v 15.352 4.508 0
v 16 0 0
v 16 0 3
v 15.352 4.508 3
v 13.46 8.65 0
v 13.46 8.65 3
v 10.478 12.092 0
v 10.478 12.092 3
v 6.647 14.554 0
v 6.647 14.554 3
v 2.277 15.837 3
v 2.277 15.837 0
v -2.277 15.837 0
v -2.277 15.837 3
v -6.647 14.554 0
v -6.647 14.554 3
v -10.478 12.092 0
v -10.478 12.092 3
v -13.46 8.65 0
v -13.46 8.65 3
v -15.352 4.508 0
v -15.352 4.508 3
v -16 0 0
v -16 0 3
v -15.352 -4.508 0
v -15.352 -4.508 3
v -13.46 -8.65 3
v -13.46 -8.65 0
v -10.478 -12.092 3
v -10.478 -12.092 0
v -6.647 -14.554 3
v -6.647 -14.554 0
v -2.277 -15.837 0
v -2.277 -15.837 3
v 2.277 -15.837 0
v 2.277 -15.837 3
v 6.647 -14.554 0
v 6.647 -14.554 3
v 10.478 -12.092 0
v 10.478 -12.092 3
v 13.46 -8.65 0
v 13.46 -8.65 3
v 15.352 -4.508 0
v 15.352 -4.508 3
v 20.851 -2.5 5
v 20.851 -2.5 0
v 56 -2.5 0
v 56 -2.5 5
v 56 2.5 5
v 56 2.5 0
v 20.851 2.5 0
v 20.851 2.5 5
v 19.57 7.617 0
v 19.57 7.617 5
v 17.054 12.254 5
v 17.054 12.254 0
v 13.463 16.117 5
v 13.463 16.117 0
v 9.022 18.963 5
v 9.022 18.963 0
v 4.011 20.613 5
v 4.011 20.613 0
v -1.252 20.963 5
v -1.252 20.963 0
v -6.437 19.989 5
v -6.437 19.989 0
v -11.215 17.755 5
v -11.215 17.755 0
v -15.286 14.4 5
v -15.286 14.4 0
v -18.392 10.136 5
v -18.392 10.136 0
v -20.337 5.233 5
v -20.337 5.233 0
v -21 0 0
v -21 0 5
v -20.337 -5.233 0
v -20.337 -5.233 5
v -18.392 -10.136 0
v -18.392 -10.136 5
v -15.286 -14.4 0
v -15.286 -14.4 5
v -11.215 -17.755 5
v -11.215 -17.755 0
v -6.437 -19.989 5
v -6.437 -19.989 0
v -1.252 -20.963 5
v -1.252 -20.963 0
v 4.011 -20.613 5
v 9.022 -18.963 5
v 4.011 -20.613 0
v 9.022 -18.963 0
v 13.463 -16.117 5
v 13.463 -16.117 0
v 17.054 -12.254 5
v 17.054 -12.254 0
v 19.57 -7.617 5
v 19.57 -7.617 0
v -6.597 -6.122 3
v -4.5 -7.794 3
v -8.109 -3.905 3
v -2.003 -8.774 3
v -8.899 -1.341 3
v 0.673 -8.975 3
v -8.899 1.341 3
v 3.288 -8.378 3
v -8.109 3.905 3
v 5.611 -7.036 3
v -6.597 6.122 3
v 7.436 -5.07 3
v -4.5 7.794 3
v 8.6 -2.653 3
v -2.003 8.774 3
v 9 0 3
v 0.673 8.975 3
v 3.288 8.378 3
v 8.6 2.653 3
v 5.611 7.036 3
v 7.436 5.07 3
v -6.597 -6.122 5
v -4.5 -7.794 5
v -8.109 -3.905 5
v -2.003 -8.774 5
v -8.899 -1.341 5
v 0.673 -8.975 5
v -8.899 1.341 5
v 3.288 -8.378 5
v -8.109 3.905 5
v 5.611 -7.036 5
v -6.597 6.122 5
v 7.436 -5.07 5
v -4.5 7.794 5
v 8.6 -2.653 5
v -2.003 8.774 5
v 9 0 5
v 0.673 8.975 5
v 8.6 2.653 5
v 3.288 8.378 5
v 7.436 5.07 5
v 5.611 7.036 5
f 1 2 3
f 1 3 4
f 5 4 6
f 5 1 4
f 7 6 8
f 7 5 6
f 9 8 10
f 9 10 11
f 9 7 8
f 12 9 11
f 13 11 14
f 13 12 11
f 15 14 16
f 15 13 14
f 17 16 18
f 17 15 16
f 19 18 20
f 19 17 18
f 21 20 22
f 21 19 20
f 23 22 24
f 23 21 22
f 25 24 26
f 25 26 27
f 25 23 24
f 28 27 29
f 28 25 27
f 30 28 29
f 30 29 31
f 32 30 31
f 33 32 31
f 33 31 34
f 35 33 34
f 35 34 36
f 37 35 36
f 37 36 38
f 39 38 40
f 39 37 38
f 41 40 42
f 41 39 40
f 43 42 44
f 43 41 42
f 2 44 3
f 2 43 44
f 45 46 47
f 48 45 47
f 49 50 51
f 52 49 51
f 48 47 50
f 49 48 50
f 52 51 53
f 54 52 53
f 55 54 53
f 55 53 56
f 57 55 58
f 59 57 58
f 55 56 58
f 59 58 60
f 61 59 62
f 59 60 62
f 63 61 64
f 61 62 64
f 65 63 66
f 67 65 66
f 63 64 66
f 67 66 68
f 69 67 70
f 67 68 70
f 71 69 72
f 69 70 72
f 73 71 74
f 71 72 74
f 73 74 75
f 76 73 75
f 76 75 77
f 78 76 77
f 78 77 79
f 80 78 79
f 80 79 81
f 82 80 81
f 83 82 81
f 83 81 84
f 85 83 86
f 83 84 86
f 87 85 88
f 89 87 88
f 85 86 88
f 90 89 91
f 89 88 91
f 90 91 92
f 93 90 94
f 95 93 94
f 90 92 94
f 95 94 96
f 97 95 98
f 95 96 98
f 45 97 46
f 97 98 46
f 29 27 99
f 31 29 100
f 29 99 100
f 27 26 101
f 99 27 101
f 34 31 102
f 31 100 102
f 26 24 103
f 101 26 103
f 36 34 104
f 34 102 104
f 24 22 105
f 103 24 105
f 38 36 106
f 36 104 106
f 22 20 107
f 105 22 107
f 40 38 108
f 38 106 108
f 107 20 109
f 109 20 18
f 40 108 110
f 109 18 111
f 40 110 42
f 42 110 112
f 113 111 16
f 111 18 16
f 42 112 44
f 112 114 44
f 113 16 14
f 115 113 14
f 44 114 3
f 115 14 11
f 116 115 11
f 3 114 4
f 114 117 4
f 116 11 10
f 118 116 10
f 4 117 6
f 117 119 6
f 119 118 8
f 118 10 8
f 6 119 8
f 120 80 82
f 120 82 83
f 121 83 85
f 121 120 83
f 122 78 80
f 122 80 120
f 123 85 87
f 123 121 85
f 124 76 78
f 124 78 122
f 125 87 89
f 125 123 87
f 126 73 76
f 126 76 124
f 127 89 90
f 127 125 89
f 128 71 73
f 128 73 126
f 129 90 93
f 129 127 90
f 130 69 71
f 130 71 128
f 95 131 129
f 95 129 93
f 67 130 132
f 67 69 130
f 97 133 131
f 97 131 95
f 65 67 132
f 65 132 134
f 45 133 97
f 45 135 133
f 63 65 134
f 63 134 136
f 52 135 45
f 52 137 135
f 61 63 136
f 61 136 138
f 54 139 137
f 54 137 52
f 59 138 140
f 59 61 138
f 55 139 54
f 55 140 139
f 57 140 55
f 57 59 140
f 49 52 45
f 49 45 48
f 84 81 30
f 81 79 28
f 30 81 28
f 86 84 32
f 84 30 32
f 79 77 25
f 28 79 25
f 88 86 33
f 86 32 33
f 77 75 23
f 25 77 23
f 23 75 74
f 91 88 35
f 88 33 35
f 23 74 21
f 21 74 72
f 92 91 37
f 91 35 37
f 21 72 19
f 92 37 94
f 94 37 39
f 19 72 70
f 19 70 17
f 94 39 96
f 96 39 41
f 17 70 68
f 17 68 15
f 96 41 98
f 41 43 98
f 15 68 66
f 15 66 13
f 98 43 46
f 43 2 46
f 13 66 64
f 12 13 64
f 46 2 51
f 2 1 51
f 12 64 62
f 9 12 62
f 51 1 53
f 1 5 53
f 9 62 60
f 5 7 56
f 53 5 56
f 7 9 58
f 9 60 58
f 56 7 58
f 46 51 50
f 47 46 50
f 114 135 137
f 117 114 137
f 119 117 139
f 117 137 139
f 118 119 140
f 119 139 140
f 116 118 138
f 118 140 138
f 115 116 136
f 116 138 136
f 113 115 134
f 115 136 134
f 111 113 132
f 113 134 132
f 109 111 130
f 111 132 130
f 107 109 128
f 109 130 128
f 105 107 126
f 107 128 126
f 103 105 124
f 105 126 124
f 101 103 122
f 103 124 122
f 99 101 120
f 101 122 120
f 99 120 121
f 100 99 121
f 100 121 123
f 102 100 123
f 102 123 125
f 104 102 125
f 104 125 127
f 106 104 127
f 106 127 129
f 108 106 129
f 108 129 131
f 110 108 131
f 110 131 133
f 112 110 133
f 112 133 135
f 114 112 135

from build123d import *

# Parameters (mm, degrees)
F0_R     = 16
F1_DEPTH = 5
F2_DEPTH = 3
F3_R     = 9
F4_DEPTH = 5.001


with BuildPart() as f1:
    # F0 (on Top) → F1 (new body)
    with BuildSketch(Plane.XY):
        with BuildLine():
            ThreePointArc((20.850659, -2.5), (20.962632, -1.252228), (21, 0))
            ThreePointArc((21, 0), (20.962632, 1.252228), (20.850659, 2.5))
            ThreePointArc((20.850659, 2.5), (-21, 0), (20.850659, -2.5))
        make_face()
        Circle(F0_R, mode=Mode.SUBTRACT)
        with BuildLine():
            ThreePointArc((20.850659, 2.5), (20.962632, 1.252228), (21, 0))
            ThreePointArc((21, 0), (20.962632, -1.252228), (20.850659, -2.5))
            Line((20.850659, -2.5), (56, -2.5))
            Line((56, -2.5), (56, 0))
            Line((56, 0), (56, 2.5))
            Line((56, 2.5), (20.850659, 2.5))
        make_face()
        Circle(F0_R)
    extrude(amount=F1_DEPTH)

    # F0 (on Top) → F2 (cut)
    with BuildSketch(Plane.XY):
        Circle(F0_R)
    extrude(amount=F2_DEPTH, mode=Mode.SUBTRACT)

    # F3 (on face) → F4 (cut, through all)
    with BuildSketch(Plane.XY.offset(5)):
        Circle(F3_R)
    extrude(amount=-F4_DEPTH, mode=Mode.SUBTRACT)


solid = f1.part
